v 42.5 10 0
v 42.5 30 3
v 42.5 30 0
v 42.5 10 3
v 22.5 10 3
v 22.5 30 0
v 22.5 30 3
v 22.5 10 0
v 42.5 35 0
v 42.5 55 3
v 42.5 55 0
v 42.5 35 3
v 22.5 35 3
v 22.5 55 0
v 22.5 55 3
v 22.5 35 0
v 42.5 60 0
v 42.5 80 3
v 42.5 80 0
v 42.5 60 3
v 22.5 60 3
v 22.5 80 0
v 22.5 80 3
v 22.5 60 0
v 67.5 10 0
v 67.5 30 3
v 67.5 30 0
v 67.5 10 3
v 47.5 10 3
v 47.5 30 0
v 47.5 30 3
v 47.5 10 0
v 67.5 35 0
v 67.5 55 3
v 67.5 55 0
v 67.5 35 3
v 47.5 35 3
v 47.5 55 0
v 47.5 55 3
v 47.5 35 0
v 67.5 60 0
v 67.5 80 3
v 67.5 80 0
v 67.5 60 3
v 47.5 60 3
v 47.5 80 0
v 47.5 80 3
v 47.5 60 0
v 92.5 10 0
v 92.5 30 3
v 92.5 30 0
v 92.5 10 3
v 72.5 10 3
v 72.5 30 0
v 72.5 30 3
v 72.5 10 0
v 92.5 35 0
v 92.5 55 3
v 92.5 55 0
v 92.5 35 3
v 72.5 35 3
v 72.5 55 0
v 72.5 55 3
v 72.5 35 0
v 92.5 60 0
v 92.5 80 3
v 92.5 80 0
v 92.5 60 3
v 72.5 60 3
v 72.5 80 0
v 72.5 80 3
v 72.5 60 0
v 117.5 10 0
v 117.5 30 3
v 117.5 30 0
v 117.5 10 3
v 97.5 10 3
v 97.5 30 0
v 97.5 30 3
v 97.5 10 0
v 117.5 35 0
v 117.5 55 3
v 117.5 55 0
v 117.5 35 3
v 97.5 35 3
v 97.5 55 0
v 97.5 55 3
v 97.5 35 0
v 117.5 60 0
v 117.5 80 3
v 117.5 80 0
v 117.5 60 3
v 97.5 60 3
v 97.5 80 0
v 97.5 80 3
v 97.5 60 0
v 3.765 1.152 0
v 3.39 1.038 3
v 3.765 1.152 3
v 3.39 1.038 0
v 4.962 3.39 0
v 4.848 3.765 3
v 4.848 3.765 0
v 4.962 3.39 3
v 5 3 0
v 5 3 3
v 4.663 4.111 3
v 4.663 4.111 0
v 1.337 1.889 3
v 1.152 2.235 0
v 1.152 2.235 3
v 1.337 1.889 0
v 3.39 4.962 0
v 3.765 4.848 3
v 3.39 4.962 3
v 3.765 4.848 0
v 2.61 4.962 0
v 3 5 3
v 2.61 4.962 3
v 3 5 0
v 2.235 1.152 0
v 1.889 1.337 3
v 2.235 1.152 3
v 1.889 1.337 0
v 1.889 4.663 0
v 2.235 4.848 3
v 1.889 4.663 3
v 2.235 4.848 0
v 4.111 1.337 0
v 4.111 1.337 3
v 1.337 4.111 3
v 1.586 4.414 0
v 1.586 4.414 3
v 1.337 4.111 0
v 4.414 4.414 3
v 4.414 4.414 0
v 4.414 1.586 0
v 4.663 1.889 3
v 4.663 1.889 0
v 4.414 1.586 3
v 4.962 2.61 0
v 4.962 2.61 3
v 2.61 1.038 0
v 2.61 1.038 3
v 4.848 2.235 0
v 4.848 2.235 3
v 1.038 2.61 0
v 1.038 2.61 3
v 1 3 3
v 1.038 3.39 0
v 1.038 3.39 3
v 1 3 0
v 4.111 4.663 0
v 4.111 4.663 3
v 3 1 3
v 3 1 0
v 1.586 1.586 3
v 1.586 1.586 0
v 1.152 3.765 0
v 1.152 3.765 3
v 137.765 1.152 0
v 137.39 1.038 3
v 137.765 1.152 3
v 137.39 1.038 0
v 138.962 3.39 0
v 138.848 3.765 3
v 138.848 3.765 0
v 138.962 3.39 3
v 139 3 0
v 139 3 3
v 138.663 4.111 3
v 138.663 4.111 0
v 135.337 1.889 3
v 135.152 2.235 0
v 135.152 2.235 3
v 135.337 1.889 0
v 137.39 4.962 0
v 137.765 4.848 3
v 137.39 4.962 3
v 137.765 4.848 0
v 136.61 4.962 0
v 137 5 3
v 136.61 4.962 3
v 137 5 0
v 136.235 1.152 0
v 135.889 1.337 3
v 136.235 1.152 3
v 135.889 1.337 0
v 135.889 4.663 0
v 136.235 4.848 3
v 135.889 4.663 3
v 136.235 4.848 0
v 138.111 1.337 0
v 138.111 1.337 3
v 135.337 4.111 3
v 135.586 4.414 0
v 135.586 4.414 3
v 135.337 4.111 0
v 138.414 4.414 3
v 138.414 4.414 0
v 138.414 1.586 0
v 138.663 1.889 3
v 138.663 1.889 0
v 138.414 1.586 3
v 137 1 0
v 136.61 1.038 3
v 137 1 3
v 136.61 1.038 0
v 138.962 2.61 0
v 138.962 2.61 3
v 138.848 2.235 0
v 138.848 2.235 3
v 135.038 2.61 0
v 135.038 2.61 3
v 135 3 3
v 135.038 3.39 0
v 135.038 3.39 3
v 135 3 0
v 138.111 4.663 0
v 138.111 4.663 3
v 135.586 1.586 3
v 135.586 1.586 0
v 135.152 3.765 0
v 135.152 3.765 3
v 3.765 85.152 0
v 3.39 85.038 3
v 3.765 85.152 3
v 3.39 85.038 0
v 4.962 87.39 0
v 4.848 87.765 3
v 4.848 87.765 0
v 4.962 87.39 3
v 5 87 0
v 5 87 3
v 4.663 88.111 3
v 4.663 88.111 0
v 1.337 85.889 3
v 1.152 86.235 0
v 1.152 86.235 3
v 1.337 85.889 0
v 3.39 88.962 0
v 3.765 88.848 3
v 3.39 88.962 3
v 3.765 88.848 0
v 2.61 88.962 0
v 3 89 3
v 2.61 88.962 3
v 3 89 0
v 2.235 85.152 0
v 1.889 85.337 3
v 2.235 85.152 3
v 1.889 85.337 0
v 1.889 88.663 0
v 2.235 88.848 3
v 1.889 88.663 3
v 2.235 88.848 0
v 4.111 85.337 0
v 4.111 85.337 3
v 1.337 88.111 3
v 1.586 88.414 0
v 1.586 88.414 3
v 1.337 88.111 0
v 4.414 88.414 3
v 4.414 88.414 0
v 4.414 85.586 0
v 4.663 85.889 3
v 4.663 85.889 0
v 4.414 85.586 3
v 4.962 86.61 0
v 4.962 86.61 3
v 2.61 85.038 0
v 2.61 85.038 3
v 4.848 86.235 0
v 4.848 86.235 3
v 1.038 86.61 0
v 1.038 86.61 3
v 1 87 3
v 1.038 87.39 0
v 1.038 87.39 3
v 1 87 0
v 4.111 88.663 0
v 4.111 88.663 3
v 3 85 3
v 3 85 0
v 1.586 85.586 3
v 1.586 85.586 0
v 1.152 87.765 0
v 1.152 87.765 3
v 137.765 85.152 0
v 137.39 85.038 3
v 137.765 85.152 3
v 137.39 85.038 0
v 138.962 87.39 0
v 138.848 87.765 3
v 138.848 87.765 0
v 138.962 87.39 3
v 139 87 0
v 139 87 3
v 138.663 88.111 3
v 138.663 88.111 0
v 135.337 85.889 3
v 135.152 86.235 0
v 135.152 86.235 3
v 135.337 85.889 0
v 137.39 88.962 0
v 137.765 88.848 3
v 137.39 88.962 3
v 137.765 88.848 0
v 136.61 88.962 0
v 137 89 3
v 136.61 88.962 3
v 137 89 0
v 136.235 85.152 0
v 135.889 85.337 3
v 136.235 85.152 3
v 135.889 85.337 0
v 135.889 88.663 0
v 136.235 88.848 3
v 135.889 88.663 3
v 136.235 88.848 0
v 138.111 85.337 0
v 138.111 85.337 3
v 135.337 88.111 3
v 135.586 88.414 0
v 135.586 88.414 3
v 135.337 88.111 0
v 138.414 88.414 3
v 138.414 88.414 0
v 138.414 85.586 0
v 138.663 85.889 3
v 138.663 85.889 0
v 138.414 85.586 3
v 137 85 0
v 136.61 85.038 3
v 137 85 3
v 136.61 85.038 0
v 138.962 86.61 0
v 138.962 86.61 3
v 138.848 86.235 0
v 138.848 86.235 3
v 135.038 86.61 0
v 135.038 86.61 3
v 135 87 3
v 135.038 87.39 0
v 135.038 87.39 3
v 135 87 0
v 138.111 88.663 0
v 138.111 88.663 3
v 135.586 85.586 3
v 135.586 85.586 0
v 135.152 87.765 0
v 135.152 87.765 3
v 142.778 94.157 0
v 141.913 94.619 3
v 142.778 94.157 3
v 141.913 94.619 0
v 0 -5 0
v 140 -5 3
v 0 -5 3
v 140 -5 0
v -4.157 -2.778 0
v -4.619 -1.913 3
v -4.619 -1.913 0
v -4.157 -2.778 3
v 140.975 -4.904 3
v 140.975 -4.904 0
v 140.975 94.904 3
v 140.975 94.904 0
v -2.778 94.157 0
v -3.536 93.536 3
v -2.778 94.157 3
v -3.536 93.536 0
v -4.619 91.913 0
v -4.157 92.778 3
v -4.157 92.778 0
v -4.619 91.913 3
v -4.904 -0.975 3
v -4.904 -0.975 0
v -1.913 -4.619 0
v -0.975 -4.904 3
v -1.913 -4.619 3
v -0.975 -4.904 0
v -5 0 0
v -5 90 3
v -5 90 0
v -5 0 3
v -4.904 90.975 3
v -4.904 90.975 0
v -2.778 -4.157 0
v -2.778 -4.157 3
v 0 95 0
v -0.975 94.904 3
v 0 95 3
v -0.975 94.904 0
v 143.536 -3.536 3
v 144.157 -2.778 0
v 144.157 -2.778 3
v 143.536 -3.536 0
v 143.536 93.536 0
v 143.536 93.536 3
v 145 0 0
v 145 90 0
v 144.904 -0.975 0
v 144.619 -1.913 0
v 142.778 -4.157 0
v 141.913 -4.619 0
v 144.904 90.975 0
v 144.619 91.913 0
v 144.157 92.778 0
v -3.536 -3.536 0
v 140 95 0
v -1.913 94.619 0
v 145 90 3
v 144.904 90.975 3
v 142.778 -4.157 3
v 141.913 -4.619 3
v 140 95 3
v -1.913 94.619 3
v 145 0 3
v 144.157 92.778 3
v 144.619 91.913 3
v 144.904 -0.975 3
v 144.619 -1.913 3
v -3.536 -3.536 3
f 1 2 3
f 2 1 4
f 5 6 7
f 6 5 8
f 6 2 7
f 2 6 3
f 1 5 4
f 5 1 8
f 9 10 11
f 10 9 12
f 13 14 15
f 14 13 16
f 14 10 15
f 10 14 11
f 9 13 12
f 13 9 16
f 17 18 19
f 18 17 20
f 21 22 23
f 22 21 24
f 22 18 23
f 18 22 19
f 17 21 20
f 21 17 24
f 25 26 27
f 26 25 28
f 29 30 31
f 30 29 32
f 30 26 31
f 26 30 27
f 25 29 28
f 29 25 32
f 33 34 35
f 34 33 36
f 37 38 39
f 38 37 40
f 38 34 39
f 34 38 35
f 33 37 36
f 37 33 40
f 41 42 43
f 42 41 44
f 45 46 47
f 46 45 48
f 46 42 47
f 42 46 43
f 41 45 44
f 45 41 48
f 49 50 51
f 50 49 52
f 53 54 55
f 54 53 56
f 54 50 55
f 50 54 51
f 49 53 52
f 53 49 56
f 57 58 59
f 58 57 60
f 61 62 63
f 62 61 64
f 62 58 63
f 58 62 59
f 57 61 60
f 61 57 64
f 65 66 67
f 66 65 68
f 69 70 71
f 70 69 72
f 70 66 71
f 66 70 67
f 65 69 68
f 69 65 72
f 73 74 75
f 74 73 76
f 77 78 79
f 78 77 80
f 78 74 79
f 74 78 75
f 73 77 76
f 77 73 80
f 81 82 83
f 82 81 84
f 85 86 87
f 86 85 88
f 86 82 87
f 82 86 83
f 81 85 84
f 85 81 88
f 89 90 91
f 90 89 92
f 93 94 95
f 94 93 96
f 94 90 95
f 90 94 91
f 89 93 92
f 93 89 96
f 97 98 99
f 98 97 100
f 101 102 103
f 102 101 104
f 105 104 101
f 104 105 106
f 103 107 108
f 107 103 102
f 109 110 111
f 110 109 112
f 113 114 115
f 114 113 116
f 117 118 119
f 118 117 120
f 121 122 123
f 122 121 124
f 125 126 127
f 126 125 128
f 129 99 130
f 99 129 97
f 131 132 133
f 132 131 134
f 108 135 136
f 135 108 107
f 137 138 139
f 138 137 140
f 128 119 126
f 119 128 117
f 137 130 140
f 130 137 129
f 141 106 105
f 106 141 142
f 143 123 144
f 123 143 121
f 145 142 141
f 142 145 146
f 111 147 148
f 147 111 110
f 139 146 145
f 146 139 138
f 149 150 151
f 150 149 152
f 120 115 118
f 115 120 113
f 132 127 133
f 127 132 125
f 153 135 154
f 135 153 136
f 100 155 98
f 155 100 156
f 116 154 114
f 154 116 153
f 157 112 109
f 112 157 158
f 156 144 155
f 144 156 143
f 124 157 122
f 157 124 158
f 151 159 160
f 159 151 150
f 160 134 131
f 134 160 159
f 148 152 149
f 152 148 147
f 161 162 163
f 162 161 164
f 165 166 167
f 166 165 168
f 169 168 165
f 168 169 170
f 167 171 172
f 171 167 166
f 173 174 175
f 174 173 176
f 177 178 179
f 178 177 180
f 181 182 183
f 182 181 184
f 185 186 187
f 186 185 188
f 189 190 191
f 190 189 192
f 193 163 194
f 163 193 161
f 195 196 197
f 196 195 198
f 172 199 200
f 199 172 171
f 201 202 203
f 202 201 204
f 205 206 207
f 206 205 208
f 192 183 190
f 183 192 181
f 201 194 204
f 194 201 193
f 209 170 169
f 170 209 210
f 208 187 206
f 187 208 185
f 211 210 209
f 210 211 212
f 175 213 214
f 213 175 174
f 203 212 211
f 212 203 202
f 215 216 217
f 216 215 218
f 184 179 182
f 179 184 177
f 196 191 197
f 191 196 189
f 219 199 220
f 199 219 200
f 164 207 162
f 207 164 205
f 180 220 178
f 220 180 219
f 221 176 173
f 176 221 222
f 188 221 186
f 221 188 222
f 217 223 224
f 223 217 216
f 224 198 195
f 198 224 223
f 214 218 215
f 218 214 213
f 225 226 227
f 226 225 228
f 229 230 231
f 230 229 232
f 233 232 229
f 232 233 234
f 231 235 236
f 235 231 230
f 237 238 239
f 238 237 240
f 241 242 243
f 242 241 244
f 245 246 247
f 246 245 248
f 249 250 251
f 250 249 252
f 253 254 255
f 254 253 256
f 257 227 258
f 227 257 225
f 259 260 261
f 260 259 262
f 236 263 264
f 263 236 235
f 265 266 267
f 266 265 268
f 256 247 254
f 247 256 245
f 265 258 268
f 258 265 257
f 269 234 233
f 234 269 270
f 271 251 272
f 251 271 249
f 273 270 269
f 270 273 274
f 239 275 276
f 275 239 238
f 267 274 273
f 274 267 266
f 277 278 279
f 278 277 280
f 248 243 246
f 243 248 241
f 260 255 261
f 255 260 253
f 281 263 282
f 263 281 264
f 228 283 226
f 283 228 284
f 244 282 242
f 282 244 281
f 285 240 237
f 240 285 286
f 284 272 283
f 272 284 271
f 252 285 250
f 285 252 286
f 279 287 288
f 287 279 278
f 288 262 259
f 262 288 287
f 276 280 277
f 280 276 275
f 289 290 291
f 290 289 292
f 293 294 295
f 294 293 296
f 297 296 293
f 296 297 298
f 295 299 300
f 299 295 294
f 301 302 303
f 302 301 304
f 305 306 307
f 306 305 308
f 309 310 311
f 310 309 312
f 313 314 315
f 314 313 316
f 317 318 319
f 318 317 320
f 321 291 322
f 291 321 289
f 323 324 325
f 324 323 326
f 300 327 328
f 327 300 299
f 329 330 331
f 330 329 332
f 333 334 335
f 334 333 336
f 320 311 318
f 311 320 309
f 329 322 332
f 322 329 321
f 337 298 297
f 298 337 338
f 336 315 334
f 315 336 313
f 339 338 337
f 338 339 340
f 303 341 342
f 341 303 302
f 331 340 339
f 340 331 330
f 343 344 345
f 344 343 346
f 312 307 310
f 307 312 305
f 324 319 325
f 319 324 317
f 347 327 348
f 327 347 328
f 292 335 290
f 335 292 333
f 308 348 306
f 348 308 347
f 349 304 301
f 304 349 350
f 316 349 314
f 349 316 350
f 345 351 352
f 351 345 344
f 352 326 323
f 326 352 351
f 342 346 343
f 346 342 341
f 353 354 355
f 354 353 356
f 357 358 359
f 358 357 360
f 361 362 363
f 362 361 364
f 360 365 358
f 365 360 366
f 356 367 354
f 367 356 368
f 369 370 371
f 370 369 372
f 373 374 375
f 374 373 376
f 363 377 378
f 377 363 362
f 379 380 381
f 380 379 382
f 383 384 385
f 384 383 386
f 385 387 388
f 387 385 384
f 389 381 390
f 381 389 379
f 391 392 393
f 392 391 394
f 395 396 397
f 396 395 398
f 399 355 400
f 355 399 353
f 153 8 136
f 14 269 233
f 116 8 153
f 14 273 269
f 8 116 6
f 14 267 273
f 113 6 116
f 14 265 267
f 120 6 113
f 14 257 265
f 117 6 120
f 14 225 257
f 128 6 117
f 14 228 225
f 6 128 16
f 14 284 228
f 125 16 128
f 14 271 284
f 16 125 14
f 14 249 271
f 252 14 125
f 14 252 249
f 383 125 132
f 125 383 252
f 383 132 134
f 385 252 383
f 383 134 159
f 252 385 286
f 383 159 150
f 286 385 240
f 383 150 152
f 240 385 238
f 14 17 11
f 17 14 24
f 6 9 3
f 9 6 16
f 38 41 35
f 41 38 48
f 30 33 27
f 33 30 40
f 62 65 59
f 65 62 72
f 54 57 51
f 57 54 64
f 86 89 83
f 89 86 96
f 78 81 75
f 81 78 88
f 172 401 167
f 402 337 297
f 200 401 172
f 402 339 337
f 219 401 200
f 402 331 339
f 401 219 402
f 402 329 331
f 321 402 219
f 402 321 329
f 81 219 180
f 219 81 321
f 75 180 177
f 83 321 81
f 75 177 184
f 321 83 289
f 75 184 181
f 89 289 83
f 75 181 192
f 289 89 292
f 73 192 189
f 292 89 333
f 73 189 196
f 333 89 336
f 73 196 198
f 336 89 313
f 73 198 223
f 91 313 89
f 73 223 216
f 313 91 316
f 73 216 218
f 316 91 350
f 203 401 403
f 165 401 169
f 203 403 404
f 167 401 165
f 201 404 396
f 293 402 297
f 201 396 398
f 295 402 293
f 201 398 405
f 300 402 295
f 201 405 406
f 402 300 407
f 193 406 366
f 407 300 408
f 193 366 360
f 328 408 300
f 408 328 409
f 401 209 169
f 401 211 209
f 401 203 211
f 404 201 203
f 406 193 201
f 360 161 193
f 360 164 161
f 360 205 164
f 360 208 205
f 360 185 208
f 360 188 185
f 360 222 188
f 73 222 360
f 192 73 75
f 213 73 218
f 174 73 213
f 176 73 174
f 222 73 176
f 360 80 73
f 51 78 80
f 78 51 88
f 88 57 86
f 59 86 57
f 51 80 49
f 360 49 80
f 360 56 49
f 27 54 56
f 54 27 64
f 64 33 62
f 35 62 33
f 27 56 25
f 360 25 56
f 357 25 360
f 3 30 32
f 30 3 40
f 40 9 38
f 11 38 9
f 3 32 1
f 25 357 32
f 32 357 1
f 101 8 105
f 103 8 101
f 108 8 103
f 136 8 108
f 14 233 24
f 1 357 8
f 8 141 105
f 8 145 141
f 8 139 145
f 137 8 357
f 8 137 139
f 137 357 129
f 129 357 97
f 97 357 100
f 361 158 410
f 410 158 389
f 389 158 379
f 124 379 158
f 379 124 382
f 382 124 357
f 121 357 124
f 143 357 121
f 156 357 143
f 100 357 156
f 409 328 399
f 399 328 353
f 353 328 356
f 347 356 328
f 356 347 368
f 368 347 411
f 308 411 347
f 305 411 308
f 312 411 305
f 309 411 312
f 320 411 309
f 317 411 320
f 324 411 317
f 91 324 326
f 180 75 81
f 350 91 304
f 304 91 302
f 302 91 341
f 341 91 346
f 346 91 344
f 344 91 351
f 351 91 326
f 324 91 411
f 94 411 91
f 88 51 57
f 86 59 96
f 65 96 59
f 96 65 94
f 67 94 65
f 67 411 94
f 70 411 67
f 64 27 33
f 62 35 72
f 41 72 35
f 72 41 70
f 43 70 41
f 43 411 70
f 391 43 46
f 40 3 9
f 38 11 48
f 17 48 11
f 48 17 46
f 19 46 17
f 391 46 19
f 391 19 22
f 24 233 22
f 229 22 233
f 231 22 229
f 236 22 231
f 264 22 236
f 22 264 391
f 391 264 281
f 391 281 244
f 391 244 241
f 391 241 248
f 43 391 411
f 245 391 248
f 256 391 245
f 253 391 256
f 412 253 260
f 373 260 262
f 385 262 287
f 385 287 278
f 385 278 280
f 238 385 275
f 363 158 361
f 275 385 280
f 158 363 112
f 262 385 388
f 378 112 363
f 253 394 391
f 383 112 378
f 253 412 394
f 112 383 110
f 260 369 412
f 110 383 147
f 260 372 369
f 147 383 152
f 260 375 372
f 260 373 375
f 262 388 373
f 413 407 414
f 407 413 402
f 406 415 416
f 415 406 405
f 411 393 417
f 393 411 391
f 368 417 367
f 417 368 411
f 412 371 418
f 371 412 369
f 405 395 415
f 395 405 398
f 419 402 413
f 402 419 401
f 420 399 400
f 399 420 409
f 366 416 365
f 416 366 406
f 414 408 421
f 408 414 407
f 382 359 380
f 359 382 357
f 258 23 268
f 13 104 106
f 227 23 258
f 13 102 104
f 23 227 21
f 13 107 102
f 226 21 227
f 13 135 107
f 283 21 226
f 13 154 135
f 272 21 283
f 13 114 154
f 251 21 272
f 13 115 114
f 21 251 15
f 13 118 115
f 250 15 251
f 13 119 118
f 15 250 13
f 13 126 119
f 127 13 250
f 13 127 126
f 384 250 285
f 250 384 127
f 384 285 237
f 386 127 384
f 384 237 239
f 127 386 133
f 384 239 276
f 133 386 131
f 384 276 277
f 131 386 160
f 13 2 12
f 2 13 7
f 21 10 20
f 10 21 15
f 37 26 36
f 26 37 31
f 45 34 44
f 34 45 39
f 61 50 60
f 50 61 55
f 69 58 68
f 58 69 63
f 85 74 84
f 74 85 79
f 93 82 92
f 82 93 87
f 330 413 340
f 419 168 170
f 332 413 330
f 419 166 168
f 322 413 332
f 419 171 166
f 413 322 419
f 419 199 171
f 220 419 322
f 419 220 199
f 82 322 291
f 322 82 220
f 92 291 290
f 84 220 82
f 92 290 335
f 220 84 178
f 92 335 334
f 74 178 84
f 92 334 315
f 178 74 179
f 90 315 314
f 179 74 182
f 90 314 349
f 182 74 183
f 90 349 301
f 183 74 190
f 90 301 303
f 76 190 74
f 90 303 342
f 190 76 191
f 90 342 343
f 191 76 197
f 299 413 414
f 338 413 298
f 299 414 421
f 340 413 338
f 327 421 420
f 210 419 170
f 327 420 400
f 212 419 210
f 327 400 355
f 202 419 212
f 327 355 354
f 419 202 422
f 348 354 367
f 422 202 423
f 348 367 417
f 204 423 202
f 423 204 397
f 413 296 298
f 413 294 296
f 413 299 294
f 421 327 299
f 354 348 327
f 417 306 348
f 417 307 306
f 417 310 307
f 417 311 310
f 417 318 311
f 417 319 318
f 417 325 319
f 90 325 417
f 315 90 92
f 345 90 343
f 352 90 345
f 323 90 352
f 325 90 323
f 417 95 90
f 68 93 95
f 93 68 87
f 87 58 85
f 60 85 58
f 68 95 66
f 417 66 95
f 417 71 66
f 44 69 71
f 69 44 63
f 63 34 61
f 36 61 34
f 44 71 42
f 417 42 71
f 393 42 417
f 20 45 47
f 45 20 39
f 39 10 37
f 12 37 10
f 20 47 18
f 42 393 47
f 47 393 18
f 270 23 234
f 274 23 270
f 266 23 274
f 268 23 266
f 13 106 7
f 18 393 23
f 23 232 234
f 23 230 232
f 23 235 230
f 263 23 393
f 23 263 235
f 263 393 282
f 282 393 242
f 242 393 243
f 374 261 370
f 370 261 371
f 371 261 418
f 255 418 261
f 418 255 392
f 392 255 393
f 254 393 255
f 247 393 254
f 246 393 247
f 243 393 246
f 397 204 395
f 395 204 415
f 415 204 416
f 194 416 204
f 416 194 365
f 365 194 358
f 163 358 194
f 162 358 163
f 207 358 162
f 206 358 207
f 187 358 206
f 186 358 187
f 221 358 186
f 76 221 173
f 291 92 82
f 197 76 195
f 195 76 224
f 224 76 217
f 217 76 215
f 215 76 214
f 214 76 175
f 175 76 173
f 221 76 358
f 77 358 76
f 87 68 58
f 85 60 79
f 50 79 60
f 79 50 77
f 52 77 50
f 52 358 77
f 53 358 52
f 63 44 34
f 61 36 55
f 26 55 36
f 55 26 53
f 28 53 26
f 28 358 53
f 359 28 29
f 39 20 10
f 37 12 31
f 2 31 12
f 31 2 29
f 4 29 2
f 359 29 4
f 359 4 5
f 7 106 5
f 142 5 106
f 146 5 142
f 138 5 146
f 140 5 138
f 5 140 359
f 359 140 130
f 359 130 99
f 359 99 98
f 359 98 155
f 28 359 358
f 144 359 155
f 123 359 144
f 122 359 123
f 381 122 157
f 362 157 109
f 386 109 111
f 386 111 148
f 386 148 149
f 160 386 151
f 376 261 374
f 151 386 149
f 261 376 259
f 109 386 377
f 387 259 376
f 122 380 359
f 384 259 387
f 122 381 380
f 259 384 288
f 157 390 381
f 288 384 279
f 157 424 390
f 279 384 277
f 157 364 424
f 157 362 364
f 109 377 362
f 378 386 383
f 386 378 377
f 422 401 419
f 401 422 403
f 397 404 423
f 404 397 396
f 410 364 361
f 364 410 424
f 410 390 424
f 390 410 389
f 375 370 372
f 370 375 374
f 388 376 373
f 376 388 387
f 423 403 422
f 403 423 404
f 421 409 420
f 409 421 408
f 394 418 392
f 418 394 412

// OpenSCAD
// Keyguard Demo
// A simplified example demonstrating multi-file project support
// A multi-file project demonstrating companion file support
// Version: demo

/* [Keyguard Settings] */
// Width of the keyguard in millimeters
width = 150; // [50:1:300]

// Height of the keyguard in millimeters  
height = 100; // [30:1:200]

// Thickness of the keyguard material
thickness = 3; // [1:0.5:10]

// Corner radius for rounded edges
corner_radius = 5; // [0:1:20]

/* [Grid Layout] */
// Number of button columns
columns = 4; // [1:1:10]

// Number of button rows
rows = 3; // [1:1:8]

// Space between buttons (gap)
button_gap = 5; // [2:1:20]

// Button opening size (square)
button_size = 20; // [10:1:50]

/* [Mounting Options] */
// Add mounting holes in corners
add_mounting_holes = true; // [true, false]

// Mounting hole diameter
mounting_hole_diameter = 4; // [2:0.5:10]

// Distance from edge to mounting hole center
mounting_hole_inset = 8; // [5:1:20]

/* [Advanced] */
// Type of keyguard
type_of_keyguard = "3D-Printed"; // ["3D-Printed", "Laser-Cut"]

// File for custom openings (optional)
openings_file = "openings_and_additions.txt";

/* [Hidden] */
$fn = 32;

// Main module
module keyguard() {
    difference() {
        // Base plate with rounded corners
        minkowski() {
            cube([width - corner_radius*2, height - corner_radius*2, thickness/2]);
            cylinder(r=corner_radius, h=thickness/2);
        }
        
        // Button grid openings
        grid_width = columns * (button_size + button_gap) - button_gap;
        grid_height = rows * (button_size + button_gap) - button_gap;
        grid_x = (width - grid_width) / 2;
        grid_y = (height - grid_height) / 2;
        
        for (col = [0:columns-1]) {
            for (row = [0:rows-1]) {
                x = grid_x + col * (button_size + button_gap);
                y = grid_y + row * (button_size + button_gap);
                translate([x - corner_radius, y - corner_radius, -1])
                    cube([button_size, button_size, thickness + 2]);
            }
        }
        
        // Mounting holes (if enabled)
        if (add_mounting_holes) {
            hole_positions = [
                [mounting_hole_inset - corner_radius, mounting_hole_inset - corner_radius],
                [width - mounting_hole_inset - corner_radius, mounting_hole_inset - corner_radius],
                [mounting_hole_inset - corner_radius, height - mounting_hole_inset - corner_radius],
                [width - mounting_hole_inset - corner_radius, height - mounting_hole_inset - corner_radius]
            ];
            
            for (pos = hole_positions) {
                translate([pos[0], pos[1], -1])
                    cylinder(d=mounting_hole_diameter, h=thickness + 2);
            }
        }
    }
}

// Render the keyguard
keyguard();

// Info text (for preview)
echo(str("Keyguard: ", width, "mm x ", height, "mm x ", thickness, "mm"));
echo(str("Grid: ", columns, " columns x ", rows, " rows"));
echo(str("Type: ", type_of_keyguard));
